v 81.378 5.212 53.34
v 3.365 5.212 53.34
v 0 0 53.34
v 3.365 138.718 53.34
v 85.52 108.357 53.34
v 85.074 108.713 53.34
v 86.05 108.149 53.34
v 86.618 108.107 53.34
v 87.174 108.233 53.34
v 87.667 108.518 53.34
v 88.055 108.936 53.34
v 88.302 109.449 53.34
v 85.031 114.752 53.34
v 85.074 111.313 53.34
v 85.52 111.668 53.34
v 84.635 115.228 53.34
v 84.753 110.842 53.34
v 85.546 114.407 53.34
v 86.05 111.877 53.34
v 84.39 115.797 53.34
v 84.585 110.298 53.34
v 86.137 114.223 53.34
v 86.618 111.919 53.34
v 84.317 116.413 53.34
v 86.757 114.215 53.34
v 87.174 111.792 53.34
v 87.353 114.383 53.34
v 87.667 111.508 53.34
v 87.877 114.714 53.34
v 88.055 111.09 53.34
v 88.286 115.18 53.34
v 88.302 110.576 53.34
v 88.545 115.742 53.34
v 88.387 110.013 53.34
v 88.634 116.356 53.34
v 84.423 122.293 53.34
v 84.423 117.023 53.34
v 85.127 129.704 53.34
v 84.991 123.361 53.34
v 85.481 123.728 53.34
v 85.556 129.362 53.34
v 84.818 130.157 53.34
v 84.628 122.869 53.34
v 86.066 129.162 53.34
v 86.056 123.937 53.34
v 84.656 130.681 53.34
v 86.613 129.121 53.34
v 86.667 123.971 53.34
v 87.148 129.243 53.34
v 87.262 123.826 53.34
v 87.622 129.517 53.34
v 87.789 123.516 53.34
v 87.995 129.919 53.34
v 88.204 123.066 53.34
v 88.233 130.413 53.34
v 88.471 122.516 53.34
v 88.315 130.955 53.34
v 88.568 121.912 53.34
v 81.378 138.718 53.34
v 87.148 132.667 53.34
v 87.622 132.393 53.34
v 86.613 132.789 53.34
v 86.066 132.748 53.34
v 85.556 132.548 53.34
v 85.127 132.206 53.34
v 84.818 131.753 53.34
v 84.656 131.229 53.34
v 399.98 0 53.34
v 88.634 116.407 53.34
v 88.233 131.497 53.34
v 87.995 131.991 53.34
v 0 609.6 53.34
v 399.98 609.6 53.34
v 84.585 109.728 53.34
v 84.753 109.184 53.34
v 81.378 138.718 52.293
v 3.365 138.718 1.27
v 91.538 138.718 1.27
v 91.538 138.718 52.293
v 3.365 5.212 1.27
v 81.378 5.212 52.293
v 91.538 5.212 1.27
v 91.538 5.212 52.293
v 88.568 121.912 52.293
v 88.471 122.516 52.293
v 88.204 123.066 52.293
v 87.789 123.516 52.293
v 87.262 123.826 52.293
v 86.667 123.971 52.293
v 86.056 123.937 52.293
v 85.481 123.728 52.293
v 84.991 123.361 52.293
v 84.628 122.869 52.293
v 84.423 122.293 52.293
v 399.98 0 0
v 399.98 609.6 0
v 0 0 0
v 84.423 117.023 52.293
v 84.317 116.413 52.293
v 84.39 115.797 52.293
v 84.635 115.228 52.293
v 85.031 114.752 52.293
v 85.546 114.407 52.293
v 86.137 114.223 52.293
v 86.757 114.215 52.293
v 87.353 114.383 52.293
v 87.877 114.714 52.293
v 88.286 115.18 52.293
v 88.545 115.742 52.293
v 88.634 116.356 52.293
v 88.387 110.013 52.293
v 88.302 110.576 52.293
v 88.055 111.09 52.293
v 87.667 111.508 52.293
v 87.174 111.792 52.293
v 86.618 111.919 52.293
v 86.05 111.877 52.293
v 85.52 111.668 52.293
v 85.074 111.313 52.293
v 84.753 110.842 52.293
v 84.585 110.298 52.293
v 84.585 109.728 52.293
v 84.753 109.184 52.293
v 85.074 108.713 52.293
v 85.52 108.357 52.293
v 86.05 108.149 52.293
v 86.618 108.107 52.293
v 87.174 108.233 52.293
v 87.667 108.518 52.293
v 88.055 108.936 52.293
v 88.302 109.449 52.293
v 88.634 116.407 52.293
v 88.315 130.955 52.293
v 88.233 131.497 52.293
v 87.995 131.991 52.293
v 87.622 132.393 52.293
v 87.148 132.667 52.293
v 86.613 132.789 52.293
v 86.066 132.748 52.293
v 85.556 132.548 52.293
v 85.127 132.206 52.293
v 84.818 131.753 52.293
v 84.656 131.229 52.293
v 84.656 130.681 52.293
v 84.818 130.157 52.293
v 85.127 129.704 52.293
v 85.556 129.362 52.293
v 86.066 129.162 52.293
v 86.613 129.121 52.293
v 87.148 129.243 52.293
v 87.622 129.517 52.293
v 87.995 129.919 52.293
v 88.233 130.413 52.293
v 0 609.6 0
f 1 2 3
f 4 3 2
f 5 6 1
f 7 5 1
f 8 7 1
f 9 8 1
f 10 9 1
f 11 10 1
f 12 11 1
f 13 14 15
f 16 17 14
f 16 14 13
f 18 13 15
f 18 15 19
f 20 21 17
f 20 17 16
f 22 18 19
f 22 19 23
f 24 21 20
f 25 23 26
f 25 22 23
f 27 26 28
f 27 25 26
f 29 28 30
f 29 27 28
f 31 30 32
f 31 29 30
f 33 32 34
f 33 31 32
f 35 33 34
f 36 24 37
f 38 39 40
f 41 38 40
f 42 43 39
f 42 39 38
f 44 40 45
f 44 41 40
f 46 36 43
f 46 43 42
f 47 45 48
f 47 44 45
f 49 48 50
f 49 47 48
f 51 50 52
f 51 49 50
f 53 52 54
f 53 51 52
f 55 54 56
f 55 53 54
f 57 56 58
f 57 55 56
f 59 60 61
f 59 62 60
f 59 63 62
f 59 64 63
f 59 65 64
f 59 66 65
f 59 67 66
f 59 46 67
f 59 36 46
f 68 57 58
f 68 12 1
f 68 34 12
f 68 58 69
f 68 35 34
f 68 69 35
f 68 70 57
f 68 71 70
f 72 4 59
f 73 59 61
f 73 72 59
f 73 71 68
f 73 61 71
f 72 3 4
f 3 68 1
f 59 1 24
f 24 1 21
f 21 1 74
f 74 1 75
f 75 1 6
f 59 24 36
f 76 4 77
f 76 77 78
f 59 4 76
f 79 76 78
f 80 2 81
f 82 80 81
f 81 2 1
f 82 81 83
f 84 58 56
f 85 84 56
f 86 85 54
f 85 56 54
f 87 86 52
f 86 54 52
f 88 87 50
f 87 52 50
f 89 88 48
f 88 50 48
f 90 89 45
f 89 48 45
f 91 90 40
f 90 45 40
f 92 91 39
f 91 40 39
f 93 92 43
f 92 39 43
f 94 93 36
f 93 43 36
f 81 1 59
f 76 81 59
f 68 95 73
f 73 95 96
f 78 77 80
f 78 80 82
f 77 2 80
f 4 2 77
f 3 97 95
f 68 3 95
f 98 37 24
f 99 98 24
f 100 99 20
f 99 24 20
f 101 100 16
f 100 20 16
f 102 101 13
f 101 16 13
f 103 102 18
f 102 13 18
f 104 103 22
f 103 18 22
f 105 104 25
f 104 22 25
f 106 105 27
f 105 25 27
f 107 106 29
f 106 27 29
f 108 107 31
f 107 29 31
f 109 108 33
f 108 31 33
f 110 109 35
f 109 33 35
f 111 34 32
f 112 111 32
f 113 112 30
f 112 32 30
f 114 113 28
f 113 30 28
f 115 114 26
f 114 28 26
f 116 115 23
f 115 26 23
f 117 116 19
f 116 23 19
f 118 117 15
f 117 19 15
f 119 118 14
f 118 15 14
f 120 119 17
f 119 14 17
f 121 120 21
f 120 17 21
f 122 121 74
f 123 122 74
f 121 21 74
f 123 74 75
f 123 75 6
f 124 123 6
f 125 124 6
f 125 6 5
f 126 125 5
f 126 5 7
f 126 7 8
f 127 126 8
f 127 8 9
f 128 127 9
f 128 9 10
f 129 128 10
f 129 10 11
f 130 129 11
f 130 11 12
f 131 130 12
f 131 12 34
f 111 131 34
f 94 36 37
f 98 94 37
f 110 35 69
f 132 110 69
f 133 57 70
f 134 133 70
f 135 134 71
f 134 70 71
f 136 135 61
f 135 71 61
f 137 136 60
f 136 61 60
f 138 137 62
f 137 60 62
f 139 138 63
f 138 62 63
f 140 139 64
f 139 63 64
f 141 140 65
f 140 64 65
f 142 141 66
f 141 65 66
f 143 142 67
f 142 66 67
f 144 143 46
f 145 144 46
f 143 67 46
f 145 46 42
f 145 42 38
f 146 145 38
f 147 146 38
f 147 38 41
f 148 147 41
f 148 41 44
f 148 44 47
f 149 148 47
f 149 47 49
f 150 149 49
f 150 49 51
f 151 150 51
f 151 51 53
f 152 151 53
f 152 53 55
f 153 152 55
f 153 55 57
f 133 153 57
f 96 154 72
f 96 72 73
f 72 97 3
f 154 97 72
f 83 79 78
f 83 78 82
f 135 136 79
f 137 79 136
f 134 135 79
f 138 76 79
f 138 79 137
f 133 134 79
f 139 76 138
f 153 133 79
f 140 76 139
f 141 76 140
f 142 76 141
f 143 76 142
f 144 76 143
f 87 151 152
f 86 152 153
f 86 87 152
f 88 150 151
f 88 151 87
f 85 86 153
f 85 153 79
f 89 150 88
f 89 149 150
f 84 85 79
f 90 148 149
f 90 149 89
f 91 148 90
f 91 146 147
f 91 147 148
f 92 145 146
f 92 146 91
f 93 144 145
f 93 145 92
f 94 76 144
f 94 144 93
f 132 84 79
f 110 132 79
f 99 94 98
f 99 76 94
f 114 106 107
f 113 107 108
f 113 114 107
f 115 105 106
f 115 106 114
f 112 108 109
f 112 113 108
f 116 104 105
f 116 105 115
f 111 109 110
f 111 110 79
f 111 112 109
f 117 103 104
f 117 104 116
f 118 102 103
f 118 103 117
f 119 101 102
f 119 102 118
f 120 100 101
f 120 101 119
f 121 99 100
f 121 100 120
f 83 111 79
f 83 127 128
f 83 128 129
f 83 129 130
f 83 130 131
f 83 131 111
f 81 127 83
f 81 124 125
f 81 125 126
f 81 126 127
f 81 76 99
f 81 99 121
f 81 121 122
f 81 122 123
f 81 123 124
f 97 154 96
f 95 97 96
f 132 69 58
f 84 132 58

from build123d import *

# Parameters (mm, degrees)
F0_W     = 399.9802543244
F0_H     = 609.6
F1_DEPTH = 53.34
F2_W     = 78.0126031023
F2_H     = 133.5061052814
F3_DEPTH = 52.07
F4_W     = 133.5061052814
F4_H     = 51.0229802537
F5_DEPTH = 10.16
F6_R     = 1.8396087238
F6_R_2   = 1.9116150916
F7_DEPTH = 25.4


with BuildPart() as f1:
    # F0 (on Top) → F1 (new body)
    with BuildSketch(Plane.XY):
        with Locations((199.9901271622, 304.8)):
            Rectangle(F0_W, F0_H)
    extrude(amount=F1_DEPTH)

    # F2 (on face) → F3 (cut)
    with BuildSketch(Plane.XY.offset(53.34)):
        with Locations((42.3716591904, 71.9645838253)):
            Rectangle(F2_W, F2_H)
    extrude(amount=-F3_DEPTH, mode=Mode.SUBTRACT)

    # F4 (on face) → F5 (cut)
    with BuildSketch(Plane(origin=(81.3779607415, 0, 0), x_dir=(0, -1, 0), z_dir=(-1, 0, 0))):
        with Locations((-71.9645838253, 26.7814901268)):
            Rectangle(F4_W, F4_H)
    extrude(amount=-F5_DEPTH, mode=Mode.SUBTRACT)

    # F6 (on face) → F7 (cut)
    with BuildSketch(Plane.XY.offset(53.34)):
        with Locations((86.4754936327, 130.9549957514)):
            Circle(F6_R)
        with BuildLine():
            Line((84.4225700873, 121.4809922279), (84.4225700873, 117.0233345083))
            ThreePointArc((84.4225700873, 117.0233345083), (86.1374283625, 114.22337587), (88.6342981207, 116.3555458188))
            Line((88.6342981207, 116.3555458188), (88.6336831498, 116.4070708193))
            Line((88.6336831498, 116.4070708193), (88.5679829552, 121.9117257152))
            ThreePointArc((88.5679829552, 121.9117257152), (86.6669107252, 123.970616392), (84.4225700873, 122.2925098566))
            Line((84.4225700873, 122.2925098566), (84.4225700873, 121.4809922279))
        make_face()
        with Locations((86.4754936327, 110.0129559636)):
            Circle(F6_R_2)
    extrude(amount=-F7_DEPTH, mode=Mode.SUBTRACT)


solid = f1.part
